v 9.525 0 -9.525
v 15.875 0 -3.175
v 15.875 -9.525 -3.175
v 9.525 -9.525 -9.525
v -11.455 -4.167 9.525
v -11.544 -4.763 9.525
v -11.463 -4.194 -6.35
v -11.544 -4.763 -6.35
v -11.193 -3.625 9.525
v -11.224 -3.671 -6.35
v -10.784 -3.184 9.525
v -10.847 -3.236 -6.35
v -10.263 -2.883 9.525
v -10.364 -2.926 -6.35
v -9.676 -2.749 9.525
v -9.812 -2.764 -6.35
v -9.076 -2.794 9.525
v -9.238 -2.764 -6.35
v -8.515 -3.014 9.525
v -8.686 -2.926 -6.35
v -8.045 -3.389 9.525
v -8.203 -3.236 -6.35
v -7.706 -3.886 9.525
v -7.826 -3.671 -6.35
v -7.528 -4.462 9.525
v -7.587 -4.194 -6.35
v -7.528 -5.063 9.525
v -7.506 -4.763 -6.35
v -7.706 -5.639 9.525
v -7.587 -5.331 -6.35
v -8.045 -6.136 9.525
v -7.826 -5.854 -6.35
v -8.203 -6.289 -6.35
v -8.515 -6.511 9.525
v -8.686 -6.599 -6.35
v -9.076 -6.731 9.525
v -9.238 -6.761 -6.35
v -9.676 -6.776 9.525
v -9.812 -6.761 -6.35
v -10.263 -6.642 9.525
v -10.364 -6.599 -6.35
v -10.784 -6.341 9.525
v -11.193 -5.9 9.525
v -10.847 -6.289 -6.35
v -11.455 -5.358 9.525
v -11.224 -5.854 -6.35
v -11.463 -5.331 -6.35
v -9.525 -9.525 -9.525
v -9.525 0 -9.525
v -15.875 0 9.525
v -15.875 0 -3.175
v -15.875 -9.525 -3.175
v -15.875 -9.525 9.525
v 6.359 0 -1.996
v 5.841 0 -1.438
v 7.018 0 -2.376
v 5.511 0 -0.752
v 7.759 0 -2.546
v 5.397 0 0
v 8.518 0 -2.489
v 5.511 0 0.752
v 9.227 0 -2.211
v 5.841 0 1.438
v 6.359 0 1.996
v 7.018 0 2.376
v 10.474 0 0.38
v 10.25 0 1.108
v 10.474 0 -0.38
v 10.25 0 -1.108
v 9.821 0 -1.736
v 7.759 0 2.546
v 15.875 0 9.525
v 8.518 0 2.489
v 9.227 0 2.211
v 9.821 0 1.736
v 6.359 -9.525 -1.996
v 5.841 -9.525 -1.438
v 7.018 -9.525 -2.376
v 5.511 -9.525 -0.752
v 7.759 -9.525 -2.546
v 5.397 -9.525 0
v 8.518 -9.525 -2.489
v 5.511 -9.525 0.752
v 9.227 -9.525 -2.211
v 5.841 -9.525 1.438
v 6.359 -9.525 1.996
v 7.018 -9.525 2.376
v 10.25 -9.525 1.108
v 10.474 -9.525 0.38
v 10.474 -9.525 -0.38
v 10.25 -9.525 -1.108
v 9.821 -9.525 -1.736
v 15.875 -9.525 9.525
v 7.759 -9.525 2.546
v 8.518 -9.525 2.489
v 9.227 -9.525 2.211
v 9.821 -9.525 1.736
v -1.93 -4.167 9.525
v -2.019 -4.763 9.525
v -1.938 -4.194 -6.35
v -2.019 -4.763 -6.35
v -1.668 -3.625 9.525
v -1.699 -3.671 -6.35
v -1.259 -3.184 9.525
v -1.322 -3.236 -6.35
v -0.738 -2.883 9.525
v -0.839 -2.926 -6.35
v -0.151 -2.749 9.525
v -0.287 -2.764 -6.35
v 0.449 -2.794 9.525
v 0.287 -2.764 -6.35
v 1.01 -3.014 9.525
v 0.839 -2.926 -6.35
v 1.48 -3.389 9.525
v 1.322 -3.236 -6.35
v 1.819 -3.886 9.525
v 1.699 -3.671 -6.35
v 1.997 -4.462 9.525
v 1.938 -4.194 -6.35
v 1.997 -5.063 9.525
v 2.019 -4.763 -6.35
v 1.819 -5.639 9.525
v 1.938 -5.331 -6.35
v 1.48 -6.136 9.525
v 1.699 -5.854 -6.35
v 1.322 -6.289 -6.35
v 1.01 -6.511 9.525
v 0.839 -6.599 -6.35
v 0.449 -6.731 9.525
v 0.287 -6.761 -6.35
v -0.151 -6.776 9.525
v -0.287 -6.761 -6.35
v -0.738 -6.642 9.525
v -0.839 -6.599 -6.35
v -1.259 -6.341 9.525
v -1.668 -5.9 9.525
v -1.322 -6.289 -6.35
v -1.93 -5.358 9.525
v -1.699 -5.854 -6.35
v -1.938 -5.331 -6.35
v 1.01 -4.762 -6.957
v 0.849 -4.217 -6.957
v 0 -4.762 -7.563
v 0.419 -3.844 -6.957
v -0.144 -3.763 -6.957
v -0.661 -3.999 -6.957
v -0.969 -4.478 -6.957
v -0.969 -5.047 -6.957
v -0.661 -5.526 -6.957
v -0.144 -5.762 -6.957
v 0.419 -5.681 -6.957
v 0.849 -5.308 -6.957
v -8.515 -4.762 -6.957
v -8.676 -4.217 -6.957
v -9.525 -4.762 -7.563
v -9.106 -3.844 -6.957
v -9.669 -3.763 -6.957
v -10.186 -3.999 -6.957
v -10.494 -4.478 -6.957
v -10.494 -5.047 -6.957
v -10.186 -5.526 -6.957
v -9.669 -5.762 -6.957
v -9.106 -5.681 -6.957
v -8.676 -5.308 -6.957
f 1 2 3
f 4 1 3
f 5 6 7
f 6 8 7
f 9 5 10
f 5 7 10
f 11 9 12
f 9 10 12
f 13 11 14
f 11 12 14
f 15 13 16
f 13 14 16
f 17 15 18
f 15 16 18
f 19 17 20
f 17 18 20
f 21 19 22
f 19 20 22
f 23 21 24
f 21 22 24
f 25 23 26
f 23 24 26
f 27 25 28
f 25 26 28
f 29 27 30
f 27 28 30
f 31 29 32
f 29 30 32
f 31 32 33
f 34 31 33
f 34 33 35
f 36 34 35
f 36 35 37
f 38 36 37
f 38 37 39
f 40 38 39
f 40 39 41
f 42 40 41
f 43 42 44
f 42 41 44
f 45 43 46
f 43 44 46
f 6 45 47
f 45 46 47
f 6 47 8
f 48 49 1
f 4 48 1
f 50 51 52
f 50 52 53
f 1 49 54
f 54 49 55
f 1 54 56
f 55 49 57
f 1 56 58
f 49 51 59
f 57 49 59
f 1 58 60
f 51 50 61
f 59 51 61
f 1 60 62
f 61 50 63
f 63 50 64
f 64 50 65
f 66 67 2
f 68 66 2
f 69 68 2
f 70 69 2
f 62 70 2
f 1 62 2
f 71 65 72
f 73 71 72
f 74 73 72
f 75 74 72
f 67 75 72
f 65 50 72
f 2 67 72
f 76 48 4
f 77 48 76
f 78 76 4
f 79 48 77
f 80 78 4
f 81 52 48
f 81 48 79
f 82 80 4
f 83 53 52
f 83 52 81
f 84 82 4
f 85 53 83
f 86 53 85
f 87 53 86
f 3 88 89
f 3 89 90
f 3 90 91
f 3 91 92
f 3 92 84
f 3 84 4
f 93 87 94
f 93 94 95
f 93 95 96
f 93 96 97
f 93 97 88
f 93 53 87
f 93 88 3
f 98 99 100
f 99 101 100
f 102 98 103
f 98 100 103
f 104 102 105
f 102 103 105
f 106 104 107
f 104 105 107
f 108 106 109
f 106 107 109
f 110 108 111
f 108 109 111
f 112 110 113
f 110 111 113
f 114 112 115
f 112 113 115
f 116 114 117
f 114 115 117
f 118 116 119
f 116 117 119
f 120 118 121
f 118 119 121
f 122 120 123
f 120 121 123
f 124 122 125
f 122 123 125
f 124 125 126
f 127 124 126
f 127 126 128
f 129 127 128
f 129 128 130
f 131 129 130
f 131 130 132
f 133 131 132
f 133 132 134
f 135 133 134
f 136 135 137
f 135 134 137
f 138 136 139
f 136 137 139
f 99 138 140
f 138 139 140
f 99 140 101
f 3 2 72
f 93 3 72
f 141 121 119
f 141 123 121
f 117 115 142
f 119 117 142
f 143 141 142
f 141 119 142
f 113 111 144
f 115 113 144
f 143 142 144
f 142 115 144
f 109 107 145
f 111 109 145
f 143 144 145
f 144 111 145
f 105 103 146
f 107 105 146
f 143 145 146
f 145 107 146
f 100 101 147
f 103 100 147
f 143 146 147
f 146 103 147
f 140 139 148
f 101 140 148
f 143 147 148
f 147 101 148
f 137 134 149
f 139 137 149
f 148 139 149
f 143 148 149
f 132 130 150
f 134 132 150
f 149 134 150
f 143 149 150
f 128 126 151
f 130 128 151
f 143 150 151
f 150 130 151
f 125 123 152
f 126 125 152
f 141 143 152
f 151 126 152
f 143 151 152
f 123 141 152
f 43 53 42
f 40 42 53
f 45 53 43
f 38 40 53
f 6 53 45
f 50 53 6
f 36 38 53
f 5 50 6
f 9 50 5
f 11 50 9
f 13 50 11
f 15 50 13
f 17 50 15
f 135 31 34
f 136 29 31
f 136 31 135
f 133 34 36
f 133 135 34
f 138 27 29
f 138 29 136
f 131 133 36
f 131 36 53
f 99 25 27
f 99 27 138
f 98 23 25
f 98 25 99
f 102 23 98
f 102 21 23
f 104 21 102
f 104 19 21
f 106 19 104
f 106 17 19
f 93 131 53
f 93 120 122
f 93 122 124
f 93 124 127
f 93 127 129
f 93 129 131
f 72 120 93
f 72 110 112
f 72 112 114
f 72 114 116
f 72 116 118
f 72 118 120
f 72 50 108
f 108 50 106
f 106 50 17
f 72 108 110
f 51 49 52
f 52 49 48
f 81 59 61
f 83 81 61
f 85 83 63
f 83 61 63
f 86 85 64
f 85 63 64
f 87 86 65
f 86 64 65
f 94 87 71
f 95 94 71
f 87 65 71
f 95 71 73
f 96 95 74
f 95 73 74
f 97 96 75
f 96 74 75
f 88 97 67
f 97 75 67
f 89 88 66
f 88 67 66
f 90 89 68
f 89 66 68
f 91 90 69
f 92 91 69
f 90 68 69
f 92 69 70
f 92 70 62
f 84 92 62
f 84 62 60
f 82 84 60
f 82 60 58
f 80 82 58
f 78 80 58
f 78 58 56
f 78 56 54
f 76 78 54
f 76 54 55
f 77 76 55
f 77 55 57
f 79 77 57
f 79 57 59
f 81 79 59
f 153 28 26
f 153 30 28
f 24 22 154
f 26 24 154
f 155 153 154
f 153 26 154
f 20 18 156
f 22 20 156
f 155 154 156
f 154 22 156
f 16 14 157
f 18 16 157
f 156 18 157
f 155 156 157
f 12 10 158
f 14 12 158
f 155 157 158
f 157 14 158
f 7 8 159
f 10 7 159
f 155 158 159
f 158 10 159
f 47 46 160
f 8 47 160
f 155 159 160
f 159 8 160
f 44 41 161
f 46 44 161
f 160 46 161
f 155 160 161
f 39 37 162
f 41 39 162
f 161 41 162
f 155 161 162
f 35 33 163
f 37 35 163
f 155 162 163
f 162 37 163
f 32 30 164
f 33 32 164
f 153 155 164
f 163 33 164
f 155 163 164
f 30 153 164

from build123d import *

# Parameters (mm, degrees)
F0_W     = 31.75
F0_H     = 19.05
F1_DEPTH = 9.525
F3_D     = 5.1054
F5_D     = 4.0386
F5_DEPTH = 15.875
F5_TIP   = 1.213317848
F6_SIZE  = 6.35


with BuildPart() as f1:
    # F0 (on Front) → F1 (new body)
    with BuildSketch(Plane.XZ):
        Rectangle(F0_W, F0_H)
    extrude(amount=F1_DEPTH)

    # F3 (through all)
    with Locations(Plane.XZ.offset(9.525)):
        with Locations((7.9502, 0)):
            Hole(F3_D / 2)

    # F5
    with Locations(Plane.XY.offset(9.525)):
        with Locations((-9.525, -4.7625), (0, -4.7625)):
            Hole(F5_D / 2, depth=F5_DEPTH)
            with Locations((0, 0, -(F5_DEPTH + F5_TIP / 2))):  # 118° drill point
                Cone(0, F5_D / 2, F5_TIP, mode=Mode.SUBTRACT)

    # F6
    f6_edges = [f1.edges().sort_by_distance(p)[0] for p in [
        (-15.875, -4.7625, -9.525),
        (15.875, -4.7625, -9.525),
    ]]
    chamfer(f6_edges, length=F6_SIZE)


solid = f1.part
